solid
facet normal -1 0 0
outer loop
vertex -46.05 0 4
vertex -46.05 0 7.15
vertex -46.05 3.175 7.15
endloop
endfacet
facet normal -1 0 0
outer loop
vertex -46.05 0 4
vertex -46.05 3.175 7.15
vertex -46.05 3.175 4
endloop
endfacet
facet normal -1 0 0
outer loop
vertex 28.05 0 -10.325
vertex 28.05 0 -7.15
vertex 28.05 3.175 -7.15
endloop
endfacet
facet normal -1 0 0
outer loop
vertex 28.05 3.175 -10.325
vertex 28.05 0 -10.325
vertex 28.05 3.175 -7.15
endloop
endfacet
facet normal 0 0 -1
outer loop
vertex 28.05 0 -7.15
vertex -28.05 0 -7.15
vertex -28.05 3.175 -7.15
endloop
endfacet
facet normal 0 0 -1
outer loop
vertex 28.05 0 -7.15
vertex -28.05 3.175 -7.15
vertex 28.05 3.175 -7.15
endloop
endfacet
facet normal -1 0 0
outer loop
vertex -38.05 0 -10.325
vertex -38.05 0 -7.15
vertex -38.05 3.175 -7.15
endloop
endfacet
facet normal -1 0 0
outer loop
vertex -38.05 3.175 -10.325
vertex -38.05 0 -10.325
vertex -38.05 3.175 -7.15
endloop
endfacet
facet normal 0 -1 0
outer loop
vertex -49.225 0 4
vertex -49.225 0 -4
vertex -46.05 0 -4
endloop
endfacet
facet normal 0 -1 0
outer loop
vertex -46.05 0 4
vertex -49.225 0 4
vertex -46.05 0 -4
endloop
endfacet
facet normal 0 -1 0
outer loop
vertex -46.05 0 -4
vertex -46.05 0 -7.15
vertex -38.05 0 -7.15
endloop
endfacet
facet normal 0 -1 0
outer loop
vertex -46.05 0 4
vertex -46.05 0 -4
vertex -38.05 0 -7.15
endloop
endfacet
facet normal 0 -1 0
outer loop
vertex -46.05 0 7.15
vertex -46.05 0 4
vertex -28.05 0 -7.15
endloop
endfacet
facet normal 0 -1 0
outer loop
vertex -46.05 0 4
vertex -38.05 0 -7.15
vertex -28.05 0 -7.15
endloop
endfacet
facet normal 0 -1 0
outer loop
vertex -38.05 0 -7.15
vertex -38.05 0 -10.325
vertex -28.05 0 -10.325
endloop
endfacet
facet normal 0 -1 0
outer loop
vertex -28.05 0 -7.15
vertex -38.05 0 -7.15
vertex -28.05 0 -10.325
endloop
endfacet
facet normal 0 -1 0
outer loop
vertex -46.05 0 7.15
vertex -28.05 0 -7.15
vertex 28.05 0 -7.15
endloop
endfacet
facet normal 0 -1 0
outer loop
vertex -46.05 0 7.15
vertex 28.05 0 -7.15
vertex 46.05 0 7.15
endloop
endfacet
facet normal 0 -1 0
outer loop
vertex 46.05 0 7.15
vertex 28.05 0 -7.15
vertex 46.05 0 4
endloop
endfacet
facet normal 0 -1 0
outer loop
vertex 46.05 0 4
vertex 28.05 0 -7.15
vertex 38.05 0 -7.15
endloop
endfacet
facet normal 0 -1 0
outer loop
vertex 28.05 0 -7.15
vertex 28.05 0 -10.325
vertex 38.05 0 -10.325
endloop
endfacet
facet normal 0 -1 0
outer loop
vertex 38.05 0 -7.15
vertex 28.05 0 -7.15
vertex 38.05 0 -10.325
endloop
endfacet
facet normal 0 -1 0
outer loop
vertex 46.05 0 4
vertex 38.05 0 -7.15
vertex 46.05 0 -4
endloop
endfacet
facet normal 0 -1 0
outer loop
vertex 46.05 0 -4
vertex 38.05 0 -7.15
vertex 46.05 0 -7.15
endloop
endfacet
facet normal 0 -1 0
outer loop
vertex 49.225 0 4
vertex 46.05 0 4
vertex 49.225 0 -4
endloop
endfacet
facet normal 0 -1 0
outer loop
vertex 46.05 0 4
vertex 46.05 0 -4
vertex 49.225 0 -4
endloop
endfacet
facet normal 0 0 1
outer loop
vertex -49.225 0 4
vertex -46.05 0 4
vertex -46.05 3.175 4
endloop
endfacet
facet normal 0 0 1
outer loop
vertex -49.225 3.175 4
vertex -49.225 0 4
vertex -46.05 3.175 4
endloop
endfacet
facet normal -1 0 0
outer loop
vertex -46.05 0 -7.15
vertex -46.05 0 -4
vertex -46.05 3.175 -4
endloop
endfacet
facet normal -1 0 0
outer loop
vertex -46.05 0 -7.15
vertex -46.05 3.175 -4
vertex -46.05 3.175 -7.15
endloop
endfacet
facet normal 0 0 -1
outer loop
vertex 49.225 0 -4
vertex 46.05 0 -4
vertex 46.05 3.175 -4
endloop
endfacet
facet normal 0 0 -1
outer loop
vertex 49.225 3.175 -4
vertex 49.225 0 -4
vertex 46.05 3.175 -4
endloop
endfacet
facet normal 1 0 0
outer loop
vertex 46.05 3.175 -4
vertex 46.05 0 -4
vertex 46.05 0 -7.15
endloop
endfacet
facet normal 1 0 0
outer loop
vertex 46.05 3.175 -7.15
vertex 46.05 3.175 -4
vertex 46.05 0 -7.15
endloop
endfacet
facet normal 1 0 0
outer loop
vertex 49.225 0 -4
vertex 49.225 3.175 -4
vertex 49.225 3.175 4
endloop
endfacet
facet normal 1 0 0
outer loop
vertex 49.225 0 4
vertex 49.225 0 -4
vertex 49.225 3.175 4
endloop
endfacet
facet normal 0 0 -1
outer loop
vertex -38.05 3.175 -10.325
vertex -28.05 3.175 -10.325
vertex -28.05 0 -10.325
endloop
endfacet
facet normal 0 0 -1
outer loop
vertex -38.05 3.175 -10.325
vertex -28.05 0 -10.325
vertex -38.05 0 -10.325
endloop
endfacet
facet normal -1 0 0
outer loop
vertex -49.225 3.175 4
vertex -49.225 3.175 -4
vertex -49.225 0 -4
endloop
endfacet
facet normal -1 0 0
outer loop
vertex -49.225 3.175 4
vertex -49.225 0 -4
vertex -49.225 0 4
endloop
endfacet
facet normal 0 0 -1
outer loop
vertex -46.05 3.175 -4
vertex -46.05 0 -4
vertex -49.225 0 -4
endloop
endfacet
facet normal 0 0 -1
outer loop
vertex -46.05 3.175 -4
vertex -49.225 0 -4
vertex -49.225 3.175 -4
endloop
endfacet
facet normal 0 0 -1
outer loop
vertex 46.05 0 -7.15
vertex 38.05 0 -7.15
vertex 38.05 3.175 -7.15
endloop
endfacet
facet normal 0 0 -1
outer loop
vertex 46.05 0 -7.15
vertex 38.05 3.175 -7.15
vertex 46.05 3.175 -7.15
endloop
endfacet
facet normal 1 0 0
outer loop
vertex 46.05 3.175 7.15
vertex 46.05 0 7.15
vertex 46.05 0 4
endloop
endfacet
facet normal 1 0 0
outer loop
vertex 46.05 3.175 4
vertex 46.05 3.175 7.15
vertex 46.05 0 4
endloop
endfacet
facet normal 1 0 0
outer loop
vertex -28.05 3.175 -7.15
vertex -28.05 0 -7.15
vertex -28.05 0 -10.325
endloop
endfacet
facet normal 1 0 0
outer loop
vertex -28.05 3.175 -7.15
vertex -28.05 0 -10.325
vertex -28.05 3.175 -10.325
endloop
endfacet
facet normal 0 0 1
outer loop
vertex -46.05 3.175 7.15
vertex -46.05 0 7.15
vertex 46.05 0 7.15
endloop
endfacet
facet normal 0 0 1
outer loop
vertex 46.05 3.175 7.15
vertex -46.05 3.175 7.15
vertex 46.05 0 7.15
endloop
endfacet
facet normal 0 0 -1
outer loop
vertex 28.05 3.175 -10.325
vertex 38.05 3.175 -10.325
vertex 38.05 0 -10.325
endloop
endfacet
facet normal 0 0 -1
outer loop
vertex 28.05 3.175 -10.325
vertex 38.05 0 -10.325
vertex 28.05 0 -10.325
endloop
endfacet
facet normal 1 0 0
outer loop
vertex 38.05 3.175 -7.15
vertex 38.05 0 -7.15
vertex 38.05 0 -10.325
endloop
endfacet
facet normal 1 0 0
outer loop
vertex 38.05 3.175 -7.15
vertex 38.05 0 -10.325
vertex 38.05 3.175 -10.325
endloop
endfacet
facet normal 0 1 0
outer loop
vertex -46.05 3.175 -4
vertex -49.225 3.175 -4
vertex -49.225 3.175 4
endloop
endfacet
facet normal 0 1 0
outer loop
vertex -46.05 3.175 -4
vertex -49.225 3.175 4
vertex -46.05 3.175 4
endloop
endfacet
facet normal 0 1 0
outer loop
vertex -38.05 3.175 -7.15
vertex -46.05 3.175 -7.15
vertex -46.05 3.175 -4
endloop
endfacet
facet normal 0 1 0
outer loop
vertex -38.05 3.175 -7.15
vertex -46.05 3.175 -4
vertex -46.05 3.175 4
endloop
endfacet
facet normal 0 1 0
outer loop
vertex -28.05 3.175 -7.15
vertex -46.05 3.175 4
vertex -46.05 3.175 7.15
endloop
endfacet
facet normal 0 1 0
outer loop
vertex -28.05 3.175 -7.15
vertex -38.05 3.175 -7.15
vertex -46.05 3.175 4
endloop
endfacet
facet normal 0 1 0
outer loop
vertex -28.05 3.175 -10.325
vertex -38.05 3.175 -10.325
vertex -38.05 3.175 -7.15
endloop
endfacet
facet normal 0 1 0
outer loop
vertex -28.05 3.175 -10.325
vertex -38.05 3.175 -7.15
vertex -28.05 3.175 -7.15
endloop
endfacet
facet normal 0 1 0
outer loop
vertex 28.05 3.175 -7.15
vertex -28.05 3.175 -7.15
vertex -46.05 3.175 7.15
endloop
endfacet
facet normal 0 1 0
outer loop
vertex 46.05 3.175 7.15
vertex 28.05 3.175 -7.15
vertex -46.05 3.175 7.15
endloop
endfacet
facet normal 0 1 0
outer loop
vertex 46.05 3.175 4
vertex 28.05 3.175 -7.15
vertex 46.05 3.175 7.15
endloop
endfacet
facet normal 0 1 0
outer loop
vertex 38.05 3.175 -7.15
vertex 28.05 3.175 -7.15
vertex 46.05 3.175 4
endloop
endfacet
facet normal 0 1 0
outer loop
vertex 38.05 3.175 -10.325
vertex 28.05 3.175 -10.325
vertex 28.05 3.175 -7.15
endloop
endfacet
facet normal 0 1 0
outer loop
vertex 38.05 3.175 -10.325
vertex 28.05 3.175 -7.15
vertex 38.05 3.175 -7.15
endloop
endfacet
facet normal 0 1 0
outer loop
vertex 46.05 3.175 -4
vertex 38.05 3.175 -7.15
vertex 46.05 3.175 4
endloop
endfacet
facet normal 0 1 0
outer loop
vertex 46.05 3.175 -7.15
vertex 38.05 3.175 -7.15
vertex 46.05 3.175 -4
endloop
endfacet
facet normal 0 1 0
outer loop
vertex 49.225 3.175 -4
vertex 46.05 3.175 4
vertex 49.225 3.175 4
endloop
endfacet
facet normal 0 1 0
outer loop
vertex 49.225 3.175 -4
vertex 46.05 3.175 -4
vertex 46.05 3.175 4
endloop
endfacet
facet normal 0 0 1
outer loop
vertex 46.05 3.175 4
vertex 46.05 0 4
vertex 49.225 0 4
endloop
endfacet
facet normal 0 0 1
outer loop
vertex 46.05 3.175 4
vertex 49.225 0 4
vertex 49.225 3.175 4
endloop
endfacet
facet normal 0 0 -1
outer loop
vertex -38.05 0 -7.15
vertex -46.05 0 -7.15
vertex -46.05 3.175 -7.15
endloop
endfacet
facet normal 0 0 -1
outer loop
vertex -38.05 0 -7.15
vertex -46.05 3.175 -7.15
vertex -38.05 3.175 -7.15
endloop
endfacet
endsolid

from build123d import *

# Parameters (mm, degrees)
SKETCH1_W           = 92.1
SKETCH1_H           = 14.3
BOSS_EXTRUDE1_DEPTH = 3.175
SKETCH2_W           = 10
SKETCH2_H           = 3.175
BOSS_EXTRUDE2_DEPTH = 3.175
SKETCH3_W           = 8
SKETCH3_H           = 3.175
BOSS_EXTRUDE3_DEPTH = 3.175


with BuildPart() as part:
    # Sketch1 → Boss-Extrude1 (new body)
    with BuildSketch(Plane(origin=(0, 0, 0), x_dir=(1, 0, 0), z_dir=(0, 1, 0))):
        Rectangle(SKETCH1_W, SKETCH1_H)
    extrude(amount=BOSS_EXTRUDE1_DEPTH)

    # Sketch2 → Boss-Extrude2 (add)
    with BuildSketch(Plane(origin=(0, 0, -7.15), x_dir=(-1, 0, 0), z_dir=(0, 0, -1))):
        with Locations((-33.05, 1.5875)):
            Rectangle(SKETCH2_W, SKETCH2_H)
        with Locations((33.05, 1.5875)):
            Rectangle(SKETCH2_W, SKETCH2_H)
    extrude(amount=BOSS_EXTRUDE2_DEPTH)

    # Sketch3 → Boss-Extrude3 (add)
    with BuildSketch(Plane.ZY.offset(46.05)):
        with Locations((0, 1.5875)):
            Rectangle(SKETCH3_W, SKETCH3_H)
    boss_extrude3 = extrude(amount=BOSS_EXTRUDE3_DEPTH)

    # Mirror1: Boss-Extrude3 across plane
    add(boss_extrude3.mirror(Plane(origin=(0, 0, 0), x_dir=(0, 0, 1), z_dir=(1, 0, 0))))


solid = part.part
